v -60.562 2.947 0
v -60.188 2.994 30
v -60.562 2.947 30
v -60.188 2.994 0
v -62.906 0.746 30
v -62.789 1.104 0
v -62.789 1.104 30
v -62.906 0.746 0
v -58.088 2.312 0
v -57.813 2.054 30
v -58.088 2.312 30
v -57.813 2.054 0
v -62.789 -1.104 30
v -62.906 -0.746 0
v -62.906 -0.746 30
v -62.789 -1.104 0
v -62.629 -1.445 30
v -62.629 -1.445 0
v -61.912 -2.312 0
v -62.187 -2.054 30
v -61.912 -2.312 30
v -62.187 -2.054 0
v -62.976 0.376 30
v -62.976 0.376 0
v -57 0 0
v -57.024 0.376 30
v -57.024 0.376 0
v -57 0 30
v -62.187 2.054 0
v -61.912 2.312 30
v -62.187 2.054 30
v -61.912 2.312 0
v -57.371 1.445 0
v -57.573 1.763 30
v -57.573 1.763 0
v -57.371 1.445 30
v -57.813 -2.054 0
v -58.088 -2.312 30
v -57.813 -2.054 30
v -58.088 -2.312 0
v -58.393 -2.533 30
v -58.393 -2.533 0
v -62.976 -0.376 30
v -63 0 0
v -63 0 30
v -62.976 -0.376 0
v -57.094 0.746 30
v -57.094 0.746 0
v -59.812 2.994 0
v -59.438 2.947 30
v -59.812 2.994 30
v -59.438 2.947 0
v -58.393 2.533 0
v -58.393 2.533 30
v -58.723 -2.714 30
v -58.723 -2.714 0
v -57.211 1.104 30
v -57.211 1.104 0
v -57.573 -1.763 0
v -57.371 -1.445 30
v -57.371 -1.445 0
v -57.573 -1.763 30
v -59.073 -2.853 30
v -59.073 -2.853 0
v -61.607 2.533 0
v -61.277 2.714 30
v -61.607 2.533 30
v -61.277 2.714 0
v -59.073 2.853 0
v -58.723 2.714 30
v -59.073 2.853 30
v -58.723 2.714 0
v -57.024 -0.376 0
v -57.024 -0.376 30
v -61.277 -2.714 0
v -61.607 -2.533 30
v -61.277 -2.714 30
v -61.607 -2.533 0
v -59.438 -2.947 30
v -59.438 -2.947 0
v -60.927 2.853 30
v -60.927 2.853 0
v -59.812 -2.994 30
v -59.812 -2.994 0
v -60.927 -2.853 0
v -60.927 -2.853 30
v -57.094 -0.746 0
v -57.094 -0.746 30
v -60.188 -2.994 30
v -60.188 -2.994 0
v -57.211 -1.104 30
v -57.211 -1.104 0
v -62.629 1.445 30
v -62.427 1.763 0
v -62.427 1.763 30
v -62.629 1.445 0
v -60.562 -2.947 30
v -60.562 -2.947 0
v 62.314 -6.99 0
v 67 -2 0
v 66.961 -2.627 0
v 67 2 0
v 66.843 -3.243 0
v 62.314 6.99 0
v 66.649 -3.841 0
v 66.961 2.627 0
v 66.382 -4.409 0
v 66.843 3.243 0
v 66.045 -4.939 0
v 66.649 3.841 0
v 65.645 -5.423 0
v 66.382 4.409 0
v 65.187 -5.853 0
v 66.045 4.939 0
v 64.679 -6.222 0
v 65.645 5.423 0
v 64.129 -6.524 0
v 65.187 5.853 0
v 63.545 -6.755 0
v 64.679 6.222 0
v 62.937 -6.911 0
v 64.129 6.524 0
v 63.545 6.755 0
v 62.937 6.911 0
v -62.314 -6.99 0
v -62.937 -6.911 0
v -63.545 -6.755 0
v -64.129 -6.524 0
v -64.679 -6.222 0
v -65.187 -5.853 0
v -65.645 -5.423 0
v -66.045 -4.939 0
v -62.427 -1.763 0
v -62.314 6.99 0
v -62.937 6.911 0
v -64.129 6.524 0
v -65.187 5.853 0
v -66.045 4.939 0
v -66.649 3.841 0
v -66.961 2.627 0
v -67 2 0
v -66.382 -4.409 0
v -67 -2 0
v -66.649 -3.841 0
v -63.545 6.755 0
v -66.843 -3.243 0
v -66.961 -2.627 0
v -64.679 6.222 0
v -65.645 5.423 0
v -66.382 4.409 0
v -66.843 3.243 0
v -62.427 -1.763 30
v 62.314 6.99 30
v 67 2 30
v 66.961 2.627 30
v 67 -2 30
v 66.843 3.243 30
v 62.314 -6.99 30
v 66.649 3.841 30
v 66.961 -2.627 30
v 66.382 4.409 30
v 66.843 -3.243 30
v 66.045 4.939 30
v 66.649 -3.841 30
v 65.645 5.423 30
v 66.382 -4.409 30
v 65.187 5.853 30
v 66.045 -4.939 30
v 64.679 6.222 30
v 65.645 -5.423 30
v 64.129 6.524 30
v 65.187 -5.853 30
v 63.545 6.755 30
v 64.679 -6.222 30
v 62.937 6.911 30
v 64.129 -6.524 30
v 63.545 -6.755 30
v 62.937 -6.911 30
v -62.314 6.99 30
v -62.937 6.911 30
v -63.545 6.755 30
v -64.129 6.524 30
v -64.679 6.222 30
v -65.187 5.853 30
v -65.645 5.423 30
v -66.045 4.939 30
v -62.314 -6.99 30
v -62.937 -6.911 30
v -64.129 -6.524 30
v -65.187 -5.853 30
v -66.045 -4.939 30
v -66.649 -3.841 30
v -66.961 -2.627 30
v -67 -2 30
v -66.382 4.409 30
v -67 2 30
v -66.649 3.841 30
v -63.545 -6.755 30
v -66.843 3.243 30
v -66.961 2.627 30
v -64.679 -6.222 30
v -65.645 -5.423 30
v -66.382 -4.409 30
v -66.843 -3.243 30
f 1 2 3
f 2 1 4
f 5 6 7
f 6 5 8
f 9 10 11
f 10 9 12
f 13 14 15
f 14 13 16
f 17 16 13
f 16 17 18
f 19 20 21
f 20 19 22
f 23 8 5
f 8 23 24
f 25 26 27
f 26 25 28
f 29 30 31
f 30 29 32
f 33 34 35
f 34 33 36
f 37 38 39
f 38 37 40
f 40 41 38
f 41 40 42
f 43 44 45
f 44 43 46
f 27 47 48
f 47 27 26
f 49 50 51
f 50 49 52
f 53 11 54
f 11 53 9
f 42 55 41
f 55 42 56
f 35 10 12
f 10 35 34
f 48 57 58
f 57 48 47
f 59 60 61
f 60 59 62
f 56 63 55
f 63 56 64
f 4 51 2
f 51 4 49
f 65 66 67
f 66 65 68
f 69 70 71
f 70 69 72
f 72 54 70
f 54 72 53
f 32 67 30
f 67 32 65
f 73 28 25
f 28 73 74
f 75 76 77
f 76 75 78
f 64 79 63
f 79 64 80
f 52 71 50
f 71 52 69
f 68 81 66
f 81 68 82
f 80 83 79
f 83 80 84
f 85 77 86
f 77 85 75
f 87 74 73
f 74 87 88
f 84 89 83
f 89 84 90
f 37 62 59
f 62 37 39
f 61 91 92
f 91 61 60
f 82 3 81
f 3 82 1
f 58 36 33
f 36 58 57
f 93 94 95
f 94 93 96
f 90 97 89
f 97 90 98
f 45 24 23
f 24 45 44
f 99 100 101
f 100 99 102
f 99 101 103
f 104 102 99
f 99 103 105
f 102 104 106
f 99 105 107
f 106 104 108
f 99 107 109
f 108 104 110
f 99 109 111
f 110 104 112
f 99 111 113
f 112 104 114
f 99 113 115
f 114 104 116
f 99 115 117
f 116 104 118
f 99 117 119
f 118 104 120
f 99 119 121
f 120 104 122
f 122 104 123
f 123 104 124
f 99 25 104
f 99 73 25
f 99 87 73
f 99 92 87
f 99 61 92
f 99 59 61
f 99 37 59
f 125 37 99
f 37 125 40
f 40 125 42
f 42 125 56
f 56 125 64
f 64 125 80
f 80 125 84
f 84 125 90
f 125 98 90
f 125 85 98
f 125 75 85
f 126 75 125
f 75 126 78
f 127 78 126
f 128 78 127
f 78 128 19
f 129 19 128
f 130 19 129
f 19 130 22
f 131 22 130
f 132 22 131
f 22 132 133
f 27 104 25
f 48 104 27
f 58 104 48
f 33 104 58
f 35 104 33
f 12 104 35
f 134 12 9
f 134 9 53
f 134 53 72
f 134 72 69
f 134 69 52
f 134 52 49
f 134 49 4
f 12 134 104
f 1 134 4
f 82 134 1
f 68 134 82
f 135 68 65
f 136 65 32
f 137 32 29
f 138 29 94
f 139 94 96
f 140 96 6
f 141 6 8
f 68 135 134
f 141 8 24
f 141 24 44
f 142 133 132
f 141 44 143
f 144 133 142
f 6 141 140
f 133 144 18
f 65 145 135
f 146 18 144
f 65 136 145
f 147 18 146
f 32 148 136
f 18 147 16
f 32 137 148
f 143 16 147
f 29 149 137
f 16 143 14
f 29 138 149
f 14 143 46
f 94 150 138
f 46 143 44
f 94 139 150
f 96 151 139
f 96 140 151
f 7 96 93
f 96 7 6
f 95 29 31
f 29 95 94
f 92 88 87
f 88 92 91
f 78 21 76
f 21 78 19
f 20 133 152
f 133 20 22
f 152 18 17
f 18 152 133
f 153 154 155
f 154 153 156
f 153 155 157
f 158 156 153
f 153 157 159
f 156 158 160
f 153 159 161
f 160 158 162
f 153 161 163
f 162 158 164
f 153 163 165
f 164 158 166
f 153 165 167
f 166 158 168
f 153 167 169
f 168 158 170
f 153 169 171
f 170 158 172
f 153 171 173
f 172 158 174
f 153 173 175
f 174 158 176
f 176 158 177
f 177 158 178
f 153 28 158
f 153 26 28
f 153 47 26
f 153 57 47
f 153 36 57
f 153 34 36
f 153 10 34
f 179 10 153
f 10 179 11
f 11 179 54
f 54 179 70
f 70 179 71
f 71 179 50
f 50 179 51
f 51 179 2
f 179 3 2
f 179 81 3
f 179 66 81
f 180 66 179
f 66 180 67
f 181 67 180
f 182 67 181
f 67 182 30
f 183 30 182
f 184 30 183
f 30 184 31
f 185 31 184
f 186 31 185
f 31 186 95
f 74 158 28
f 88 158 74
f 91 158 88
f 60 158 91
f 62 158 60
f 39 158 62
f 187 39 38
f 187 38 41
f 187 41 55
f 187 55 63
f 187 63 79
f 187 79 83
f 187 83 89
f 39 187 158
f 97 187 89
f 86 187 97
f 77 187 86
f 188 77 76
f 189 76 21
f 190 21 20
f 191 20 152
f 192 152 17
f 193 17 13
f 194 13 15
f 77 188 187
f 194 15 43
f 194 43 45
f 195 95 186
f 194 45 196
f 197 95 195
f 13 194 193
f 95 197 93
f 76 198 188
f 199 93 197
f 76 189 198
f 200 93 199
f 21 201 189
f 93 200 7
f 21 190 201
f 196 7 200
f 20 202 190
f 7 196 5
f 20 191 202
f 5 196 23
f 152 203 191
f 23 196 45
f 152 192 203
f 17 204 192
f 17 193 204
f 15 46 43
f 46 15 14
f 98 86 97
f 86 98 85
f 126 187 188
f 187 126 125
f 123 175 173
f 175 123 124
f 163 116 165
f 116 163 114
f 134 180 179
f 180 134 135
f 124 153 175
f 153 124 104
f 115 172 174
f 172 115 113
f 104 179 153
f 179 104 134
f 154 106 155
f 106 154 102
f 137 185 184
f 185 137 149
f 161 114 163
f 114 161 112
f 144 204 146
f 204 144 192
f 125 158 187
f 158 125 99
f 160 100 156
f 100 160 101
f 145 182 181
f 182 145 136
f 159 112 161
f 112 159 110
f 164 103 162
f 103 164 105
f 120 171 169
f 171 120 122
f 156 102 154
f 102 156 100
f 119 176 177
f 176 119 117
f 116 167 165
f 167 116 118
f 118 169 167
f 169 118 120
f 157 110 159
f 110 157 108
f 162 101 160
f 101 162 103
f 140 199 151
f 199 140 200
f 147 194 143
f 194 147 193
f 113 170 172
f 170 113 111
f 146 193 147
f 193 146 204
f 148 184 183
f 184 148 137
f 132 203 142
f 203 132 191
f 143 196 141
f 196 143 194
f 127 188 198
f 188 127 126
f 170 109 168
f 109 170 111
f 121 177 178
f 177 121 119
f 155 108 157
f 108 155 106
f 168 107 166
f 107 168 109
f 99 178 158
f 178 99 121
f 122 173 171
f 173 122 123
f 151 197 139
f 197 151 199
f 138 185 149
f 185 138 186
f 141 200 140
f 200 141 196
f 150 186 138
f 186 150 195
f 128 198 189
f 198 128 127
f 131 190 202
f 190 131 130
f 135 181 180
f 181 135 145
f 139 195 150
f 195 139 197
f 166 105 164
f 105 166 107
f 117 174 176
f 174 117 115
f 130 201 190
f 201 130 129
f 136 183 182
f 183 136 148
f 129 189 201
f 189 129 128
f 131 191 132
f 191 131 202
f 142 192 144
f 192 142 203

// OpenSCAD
$fn = 50;


difference() {
	union() {
		hull() {
			translate(v = [-62.0000000000, 2.0000000000, 0]) {
				cylinder(h = 30, r = 5);
			}
			translate(v = [62.0000000000, 2.0000000000, 0]) {
				cylinder(h = 30, r = 5);
			}
			translate(v = [-62.0000000000, -2.0000000000, 0]) {
				cylinder(h = 30, r = 5);
			}
			translate(v = [62.0000000000, -2.0000000000, 0]) {
				cylinder(h = 30, r = 5);
			}
		}
	}
	union() {
		translate(v = [-60.0000000000, 0.0000000000, 0]) {
			cylinder(h = 30, r = 3.0000000000);
		}
		translate(v = [-60.0000000000, 0.0000000000, 0]) {
			cylinder(h = 30, r = 1.5000000000);
		}
		translate(v = [-60.0000000000, 0.0000000000, 0]) {
			cylinder(h = 30, r = 1.5000000000);
		}
		translate(v = [-60.0000000000, 0.0000000000, 0]) {
			cylinder(h = 30, r = 1.5000000000);
		}
	}
}
